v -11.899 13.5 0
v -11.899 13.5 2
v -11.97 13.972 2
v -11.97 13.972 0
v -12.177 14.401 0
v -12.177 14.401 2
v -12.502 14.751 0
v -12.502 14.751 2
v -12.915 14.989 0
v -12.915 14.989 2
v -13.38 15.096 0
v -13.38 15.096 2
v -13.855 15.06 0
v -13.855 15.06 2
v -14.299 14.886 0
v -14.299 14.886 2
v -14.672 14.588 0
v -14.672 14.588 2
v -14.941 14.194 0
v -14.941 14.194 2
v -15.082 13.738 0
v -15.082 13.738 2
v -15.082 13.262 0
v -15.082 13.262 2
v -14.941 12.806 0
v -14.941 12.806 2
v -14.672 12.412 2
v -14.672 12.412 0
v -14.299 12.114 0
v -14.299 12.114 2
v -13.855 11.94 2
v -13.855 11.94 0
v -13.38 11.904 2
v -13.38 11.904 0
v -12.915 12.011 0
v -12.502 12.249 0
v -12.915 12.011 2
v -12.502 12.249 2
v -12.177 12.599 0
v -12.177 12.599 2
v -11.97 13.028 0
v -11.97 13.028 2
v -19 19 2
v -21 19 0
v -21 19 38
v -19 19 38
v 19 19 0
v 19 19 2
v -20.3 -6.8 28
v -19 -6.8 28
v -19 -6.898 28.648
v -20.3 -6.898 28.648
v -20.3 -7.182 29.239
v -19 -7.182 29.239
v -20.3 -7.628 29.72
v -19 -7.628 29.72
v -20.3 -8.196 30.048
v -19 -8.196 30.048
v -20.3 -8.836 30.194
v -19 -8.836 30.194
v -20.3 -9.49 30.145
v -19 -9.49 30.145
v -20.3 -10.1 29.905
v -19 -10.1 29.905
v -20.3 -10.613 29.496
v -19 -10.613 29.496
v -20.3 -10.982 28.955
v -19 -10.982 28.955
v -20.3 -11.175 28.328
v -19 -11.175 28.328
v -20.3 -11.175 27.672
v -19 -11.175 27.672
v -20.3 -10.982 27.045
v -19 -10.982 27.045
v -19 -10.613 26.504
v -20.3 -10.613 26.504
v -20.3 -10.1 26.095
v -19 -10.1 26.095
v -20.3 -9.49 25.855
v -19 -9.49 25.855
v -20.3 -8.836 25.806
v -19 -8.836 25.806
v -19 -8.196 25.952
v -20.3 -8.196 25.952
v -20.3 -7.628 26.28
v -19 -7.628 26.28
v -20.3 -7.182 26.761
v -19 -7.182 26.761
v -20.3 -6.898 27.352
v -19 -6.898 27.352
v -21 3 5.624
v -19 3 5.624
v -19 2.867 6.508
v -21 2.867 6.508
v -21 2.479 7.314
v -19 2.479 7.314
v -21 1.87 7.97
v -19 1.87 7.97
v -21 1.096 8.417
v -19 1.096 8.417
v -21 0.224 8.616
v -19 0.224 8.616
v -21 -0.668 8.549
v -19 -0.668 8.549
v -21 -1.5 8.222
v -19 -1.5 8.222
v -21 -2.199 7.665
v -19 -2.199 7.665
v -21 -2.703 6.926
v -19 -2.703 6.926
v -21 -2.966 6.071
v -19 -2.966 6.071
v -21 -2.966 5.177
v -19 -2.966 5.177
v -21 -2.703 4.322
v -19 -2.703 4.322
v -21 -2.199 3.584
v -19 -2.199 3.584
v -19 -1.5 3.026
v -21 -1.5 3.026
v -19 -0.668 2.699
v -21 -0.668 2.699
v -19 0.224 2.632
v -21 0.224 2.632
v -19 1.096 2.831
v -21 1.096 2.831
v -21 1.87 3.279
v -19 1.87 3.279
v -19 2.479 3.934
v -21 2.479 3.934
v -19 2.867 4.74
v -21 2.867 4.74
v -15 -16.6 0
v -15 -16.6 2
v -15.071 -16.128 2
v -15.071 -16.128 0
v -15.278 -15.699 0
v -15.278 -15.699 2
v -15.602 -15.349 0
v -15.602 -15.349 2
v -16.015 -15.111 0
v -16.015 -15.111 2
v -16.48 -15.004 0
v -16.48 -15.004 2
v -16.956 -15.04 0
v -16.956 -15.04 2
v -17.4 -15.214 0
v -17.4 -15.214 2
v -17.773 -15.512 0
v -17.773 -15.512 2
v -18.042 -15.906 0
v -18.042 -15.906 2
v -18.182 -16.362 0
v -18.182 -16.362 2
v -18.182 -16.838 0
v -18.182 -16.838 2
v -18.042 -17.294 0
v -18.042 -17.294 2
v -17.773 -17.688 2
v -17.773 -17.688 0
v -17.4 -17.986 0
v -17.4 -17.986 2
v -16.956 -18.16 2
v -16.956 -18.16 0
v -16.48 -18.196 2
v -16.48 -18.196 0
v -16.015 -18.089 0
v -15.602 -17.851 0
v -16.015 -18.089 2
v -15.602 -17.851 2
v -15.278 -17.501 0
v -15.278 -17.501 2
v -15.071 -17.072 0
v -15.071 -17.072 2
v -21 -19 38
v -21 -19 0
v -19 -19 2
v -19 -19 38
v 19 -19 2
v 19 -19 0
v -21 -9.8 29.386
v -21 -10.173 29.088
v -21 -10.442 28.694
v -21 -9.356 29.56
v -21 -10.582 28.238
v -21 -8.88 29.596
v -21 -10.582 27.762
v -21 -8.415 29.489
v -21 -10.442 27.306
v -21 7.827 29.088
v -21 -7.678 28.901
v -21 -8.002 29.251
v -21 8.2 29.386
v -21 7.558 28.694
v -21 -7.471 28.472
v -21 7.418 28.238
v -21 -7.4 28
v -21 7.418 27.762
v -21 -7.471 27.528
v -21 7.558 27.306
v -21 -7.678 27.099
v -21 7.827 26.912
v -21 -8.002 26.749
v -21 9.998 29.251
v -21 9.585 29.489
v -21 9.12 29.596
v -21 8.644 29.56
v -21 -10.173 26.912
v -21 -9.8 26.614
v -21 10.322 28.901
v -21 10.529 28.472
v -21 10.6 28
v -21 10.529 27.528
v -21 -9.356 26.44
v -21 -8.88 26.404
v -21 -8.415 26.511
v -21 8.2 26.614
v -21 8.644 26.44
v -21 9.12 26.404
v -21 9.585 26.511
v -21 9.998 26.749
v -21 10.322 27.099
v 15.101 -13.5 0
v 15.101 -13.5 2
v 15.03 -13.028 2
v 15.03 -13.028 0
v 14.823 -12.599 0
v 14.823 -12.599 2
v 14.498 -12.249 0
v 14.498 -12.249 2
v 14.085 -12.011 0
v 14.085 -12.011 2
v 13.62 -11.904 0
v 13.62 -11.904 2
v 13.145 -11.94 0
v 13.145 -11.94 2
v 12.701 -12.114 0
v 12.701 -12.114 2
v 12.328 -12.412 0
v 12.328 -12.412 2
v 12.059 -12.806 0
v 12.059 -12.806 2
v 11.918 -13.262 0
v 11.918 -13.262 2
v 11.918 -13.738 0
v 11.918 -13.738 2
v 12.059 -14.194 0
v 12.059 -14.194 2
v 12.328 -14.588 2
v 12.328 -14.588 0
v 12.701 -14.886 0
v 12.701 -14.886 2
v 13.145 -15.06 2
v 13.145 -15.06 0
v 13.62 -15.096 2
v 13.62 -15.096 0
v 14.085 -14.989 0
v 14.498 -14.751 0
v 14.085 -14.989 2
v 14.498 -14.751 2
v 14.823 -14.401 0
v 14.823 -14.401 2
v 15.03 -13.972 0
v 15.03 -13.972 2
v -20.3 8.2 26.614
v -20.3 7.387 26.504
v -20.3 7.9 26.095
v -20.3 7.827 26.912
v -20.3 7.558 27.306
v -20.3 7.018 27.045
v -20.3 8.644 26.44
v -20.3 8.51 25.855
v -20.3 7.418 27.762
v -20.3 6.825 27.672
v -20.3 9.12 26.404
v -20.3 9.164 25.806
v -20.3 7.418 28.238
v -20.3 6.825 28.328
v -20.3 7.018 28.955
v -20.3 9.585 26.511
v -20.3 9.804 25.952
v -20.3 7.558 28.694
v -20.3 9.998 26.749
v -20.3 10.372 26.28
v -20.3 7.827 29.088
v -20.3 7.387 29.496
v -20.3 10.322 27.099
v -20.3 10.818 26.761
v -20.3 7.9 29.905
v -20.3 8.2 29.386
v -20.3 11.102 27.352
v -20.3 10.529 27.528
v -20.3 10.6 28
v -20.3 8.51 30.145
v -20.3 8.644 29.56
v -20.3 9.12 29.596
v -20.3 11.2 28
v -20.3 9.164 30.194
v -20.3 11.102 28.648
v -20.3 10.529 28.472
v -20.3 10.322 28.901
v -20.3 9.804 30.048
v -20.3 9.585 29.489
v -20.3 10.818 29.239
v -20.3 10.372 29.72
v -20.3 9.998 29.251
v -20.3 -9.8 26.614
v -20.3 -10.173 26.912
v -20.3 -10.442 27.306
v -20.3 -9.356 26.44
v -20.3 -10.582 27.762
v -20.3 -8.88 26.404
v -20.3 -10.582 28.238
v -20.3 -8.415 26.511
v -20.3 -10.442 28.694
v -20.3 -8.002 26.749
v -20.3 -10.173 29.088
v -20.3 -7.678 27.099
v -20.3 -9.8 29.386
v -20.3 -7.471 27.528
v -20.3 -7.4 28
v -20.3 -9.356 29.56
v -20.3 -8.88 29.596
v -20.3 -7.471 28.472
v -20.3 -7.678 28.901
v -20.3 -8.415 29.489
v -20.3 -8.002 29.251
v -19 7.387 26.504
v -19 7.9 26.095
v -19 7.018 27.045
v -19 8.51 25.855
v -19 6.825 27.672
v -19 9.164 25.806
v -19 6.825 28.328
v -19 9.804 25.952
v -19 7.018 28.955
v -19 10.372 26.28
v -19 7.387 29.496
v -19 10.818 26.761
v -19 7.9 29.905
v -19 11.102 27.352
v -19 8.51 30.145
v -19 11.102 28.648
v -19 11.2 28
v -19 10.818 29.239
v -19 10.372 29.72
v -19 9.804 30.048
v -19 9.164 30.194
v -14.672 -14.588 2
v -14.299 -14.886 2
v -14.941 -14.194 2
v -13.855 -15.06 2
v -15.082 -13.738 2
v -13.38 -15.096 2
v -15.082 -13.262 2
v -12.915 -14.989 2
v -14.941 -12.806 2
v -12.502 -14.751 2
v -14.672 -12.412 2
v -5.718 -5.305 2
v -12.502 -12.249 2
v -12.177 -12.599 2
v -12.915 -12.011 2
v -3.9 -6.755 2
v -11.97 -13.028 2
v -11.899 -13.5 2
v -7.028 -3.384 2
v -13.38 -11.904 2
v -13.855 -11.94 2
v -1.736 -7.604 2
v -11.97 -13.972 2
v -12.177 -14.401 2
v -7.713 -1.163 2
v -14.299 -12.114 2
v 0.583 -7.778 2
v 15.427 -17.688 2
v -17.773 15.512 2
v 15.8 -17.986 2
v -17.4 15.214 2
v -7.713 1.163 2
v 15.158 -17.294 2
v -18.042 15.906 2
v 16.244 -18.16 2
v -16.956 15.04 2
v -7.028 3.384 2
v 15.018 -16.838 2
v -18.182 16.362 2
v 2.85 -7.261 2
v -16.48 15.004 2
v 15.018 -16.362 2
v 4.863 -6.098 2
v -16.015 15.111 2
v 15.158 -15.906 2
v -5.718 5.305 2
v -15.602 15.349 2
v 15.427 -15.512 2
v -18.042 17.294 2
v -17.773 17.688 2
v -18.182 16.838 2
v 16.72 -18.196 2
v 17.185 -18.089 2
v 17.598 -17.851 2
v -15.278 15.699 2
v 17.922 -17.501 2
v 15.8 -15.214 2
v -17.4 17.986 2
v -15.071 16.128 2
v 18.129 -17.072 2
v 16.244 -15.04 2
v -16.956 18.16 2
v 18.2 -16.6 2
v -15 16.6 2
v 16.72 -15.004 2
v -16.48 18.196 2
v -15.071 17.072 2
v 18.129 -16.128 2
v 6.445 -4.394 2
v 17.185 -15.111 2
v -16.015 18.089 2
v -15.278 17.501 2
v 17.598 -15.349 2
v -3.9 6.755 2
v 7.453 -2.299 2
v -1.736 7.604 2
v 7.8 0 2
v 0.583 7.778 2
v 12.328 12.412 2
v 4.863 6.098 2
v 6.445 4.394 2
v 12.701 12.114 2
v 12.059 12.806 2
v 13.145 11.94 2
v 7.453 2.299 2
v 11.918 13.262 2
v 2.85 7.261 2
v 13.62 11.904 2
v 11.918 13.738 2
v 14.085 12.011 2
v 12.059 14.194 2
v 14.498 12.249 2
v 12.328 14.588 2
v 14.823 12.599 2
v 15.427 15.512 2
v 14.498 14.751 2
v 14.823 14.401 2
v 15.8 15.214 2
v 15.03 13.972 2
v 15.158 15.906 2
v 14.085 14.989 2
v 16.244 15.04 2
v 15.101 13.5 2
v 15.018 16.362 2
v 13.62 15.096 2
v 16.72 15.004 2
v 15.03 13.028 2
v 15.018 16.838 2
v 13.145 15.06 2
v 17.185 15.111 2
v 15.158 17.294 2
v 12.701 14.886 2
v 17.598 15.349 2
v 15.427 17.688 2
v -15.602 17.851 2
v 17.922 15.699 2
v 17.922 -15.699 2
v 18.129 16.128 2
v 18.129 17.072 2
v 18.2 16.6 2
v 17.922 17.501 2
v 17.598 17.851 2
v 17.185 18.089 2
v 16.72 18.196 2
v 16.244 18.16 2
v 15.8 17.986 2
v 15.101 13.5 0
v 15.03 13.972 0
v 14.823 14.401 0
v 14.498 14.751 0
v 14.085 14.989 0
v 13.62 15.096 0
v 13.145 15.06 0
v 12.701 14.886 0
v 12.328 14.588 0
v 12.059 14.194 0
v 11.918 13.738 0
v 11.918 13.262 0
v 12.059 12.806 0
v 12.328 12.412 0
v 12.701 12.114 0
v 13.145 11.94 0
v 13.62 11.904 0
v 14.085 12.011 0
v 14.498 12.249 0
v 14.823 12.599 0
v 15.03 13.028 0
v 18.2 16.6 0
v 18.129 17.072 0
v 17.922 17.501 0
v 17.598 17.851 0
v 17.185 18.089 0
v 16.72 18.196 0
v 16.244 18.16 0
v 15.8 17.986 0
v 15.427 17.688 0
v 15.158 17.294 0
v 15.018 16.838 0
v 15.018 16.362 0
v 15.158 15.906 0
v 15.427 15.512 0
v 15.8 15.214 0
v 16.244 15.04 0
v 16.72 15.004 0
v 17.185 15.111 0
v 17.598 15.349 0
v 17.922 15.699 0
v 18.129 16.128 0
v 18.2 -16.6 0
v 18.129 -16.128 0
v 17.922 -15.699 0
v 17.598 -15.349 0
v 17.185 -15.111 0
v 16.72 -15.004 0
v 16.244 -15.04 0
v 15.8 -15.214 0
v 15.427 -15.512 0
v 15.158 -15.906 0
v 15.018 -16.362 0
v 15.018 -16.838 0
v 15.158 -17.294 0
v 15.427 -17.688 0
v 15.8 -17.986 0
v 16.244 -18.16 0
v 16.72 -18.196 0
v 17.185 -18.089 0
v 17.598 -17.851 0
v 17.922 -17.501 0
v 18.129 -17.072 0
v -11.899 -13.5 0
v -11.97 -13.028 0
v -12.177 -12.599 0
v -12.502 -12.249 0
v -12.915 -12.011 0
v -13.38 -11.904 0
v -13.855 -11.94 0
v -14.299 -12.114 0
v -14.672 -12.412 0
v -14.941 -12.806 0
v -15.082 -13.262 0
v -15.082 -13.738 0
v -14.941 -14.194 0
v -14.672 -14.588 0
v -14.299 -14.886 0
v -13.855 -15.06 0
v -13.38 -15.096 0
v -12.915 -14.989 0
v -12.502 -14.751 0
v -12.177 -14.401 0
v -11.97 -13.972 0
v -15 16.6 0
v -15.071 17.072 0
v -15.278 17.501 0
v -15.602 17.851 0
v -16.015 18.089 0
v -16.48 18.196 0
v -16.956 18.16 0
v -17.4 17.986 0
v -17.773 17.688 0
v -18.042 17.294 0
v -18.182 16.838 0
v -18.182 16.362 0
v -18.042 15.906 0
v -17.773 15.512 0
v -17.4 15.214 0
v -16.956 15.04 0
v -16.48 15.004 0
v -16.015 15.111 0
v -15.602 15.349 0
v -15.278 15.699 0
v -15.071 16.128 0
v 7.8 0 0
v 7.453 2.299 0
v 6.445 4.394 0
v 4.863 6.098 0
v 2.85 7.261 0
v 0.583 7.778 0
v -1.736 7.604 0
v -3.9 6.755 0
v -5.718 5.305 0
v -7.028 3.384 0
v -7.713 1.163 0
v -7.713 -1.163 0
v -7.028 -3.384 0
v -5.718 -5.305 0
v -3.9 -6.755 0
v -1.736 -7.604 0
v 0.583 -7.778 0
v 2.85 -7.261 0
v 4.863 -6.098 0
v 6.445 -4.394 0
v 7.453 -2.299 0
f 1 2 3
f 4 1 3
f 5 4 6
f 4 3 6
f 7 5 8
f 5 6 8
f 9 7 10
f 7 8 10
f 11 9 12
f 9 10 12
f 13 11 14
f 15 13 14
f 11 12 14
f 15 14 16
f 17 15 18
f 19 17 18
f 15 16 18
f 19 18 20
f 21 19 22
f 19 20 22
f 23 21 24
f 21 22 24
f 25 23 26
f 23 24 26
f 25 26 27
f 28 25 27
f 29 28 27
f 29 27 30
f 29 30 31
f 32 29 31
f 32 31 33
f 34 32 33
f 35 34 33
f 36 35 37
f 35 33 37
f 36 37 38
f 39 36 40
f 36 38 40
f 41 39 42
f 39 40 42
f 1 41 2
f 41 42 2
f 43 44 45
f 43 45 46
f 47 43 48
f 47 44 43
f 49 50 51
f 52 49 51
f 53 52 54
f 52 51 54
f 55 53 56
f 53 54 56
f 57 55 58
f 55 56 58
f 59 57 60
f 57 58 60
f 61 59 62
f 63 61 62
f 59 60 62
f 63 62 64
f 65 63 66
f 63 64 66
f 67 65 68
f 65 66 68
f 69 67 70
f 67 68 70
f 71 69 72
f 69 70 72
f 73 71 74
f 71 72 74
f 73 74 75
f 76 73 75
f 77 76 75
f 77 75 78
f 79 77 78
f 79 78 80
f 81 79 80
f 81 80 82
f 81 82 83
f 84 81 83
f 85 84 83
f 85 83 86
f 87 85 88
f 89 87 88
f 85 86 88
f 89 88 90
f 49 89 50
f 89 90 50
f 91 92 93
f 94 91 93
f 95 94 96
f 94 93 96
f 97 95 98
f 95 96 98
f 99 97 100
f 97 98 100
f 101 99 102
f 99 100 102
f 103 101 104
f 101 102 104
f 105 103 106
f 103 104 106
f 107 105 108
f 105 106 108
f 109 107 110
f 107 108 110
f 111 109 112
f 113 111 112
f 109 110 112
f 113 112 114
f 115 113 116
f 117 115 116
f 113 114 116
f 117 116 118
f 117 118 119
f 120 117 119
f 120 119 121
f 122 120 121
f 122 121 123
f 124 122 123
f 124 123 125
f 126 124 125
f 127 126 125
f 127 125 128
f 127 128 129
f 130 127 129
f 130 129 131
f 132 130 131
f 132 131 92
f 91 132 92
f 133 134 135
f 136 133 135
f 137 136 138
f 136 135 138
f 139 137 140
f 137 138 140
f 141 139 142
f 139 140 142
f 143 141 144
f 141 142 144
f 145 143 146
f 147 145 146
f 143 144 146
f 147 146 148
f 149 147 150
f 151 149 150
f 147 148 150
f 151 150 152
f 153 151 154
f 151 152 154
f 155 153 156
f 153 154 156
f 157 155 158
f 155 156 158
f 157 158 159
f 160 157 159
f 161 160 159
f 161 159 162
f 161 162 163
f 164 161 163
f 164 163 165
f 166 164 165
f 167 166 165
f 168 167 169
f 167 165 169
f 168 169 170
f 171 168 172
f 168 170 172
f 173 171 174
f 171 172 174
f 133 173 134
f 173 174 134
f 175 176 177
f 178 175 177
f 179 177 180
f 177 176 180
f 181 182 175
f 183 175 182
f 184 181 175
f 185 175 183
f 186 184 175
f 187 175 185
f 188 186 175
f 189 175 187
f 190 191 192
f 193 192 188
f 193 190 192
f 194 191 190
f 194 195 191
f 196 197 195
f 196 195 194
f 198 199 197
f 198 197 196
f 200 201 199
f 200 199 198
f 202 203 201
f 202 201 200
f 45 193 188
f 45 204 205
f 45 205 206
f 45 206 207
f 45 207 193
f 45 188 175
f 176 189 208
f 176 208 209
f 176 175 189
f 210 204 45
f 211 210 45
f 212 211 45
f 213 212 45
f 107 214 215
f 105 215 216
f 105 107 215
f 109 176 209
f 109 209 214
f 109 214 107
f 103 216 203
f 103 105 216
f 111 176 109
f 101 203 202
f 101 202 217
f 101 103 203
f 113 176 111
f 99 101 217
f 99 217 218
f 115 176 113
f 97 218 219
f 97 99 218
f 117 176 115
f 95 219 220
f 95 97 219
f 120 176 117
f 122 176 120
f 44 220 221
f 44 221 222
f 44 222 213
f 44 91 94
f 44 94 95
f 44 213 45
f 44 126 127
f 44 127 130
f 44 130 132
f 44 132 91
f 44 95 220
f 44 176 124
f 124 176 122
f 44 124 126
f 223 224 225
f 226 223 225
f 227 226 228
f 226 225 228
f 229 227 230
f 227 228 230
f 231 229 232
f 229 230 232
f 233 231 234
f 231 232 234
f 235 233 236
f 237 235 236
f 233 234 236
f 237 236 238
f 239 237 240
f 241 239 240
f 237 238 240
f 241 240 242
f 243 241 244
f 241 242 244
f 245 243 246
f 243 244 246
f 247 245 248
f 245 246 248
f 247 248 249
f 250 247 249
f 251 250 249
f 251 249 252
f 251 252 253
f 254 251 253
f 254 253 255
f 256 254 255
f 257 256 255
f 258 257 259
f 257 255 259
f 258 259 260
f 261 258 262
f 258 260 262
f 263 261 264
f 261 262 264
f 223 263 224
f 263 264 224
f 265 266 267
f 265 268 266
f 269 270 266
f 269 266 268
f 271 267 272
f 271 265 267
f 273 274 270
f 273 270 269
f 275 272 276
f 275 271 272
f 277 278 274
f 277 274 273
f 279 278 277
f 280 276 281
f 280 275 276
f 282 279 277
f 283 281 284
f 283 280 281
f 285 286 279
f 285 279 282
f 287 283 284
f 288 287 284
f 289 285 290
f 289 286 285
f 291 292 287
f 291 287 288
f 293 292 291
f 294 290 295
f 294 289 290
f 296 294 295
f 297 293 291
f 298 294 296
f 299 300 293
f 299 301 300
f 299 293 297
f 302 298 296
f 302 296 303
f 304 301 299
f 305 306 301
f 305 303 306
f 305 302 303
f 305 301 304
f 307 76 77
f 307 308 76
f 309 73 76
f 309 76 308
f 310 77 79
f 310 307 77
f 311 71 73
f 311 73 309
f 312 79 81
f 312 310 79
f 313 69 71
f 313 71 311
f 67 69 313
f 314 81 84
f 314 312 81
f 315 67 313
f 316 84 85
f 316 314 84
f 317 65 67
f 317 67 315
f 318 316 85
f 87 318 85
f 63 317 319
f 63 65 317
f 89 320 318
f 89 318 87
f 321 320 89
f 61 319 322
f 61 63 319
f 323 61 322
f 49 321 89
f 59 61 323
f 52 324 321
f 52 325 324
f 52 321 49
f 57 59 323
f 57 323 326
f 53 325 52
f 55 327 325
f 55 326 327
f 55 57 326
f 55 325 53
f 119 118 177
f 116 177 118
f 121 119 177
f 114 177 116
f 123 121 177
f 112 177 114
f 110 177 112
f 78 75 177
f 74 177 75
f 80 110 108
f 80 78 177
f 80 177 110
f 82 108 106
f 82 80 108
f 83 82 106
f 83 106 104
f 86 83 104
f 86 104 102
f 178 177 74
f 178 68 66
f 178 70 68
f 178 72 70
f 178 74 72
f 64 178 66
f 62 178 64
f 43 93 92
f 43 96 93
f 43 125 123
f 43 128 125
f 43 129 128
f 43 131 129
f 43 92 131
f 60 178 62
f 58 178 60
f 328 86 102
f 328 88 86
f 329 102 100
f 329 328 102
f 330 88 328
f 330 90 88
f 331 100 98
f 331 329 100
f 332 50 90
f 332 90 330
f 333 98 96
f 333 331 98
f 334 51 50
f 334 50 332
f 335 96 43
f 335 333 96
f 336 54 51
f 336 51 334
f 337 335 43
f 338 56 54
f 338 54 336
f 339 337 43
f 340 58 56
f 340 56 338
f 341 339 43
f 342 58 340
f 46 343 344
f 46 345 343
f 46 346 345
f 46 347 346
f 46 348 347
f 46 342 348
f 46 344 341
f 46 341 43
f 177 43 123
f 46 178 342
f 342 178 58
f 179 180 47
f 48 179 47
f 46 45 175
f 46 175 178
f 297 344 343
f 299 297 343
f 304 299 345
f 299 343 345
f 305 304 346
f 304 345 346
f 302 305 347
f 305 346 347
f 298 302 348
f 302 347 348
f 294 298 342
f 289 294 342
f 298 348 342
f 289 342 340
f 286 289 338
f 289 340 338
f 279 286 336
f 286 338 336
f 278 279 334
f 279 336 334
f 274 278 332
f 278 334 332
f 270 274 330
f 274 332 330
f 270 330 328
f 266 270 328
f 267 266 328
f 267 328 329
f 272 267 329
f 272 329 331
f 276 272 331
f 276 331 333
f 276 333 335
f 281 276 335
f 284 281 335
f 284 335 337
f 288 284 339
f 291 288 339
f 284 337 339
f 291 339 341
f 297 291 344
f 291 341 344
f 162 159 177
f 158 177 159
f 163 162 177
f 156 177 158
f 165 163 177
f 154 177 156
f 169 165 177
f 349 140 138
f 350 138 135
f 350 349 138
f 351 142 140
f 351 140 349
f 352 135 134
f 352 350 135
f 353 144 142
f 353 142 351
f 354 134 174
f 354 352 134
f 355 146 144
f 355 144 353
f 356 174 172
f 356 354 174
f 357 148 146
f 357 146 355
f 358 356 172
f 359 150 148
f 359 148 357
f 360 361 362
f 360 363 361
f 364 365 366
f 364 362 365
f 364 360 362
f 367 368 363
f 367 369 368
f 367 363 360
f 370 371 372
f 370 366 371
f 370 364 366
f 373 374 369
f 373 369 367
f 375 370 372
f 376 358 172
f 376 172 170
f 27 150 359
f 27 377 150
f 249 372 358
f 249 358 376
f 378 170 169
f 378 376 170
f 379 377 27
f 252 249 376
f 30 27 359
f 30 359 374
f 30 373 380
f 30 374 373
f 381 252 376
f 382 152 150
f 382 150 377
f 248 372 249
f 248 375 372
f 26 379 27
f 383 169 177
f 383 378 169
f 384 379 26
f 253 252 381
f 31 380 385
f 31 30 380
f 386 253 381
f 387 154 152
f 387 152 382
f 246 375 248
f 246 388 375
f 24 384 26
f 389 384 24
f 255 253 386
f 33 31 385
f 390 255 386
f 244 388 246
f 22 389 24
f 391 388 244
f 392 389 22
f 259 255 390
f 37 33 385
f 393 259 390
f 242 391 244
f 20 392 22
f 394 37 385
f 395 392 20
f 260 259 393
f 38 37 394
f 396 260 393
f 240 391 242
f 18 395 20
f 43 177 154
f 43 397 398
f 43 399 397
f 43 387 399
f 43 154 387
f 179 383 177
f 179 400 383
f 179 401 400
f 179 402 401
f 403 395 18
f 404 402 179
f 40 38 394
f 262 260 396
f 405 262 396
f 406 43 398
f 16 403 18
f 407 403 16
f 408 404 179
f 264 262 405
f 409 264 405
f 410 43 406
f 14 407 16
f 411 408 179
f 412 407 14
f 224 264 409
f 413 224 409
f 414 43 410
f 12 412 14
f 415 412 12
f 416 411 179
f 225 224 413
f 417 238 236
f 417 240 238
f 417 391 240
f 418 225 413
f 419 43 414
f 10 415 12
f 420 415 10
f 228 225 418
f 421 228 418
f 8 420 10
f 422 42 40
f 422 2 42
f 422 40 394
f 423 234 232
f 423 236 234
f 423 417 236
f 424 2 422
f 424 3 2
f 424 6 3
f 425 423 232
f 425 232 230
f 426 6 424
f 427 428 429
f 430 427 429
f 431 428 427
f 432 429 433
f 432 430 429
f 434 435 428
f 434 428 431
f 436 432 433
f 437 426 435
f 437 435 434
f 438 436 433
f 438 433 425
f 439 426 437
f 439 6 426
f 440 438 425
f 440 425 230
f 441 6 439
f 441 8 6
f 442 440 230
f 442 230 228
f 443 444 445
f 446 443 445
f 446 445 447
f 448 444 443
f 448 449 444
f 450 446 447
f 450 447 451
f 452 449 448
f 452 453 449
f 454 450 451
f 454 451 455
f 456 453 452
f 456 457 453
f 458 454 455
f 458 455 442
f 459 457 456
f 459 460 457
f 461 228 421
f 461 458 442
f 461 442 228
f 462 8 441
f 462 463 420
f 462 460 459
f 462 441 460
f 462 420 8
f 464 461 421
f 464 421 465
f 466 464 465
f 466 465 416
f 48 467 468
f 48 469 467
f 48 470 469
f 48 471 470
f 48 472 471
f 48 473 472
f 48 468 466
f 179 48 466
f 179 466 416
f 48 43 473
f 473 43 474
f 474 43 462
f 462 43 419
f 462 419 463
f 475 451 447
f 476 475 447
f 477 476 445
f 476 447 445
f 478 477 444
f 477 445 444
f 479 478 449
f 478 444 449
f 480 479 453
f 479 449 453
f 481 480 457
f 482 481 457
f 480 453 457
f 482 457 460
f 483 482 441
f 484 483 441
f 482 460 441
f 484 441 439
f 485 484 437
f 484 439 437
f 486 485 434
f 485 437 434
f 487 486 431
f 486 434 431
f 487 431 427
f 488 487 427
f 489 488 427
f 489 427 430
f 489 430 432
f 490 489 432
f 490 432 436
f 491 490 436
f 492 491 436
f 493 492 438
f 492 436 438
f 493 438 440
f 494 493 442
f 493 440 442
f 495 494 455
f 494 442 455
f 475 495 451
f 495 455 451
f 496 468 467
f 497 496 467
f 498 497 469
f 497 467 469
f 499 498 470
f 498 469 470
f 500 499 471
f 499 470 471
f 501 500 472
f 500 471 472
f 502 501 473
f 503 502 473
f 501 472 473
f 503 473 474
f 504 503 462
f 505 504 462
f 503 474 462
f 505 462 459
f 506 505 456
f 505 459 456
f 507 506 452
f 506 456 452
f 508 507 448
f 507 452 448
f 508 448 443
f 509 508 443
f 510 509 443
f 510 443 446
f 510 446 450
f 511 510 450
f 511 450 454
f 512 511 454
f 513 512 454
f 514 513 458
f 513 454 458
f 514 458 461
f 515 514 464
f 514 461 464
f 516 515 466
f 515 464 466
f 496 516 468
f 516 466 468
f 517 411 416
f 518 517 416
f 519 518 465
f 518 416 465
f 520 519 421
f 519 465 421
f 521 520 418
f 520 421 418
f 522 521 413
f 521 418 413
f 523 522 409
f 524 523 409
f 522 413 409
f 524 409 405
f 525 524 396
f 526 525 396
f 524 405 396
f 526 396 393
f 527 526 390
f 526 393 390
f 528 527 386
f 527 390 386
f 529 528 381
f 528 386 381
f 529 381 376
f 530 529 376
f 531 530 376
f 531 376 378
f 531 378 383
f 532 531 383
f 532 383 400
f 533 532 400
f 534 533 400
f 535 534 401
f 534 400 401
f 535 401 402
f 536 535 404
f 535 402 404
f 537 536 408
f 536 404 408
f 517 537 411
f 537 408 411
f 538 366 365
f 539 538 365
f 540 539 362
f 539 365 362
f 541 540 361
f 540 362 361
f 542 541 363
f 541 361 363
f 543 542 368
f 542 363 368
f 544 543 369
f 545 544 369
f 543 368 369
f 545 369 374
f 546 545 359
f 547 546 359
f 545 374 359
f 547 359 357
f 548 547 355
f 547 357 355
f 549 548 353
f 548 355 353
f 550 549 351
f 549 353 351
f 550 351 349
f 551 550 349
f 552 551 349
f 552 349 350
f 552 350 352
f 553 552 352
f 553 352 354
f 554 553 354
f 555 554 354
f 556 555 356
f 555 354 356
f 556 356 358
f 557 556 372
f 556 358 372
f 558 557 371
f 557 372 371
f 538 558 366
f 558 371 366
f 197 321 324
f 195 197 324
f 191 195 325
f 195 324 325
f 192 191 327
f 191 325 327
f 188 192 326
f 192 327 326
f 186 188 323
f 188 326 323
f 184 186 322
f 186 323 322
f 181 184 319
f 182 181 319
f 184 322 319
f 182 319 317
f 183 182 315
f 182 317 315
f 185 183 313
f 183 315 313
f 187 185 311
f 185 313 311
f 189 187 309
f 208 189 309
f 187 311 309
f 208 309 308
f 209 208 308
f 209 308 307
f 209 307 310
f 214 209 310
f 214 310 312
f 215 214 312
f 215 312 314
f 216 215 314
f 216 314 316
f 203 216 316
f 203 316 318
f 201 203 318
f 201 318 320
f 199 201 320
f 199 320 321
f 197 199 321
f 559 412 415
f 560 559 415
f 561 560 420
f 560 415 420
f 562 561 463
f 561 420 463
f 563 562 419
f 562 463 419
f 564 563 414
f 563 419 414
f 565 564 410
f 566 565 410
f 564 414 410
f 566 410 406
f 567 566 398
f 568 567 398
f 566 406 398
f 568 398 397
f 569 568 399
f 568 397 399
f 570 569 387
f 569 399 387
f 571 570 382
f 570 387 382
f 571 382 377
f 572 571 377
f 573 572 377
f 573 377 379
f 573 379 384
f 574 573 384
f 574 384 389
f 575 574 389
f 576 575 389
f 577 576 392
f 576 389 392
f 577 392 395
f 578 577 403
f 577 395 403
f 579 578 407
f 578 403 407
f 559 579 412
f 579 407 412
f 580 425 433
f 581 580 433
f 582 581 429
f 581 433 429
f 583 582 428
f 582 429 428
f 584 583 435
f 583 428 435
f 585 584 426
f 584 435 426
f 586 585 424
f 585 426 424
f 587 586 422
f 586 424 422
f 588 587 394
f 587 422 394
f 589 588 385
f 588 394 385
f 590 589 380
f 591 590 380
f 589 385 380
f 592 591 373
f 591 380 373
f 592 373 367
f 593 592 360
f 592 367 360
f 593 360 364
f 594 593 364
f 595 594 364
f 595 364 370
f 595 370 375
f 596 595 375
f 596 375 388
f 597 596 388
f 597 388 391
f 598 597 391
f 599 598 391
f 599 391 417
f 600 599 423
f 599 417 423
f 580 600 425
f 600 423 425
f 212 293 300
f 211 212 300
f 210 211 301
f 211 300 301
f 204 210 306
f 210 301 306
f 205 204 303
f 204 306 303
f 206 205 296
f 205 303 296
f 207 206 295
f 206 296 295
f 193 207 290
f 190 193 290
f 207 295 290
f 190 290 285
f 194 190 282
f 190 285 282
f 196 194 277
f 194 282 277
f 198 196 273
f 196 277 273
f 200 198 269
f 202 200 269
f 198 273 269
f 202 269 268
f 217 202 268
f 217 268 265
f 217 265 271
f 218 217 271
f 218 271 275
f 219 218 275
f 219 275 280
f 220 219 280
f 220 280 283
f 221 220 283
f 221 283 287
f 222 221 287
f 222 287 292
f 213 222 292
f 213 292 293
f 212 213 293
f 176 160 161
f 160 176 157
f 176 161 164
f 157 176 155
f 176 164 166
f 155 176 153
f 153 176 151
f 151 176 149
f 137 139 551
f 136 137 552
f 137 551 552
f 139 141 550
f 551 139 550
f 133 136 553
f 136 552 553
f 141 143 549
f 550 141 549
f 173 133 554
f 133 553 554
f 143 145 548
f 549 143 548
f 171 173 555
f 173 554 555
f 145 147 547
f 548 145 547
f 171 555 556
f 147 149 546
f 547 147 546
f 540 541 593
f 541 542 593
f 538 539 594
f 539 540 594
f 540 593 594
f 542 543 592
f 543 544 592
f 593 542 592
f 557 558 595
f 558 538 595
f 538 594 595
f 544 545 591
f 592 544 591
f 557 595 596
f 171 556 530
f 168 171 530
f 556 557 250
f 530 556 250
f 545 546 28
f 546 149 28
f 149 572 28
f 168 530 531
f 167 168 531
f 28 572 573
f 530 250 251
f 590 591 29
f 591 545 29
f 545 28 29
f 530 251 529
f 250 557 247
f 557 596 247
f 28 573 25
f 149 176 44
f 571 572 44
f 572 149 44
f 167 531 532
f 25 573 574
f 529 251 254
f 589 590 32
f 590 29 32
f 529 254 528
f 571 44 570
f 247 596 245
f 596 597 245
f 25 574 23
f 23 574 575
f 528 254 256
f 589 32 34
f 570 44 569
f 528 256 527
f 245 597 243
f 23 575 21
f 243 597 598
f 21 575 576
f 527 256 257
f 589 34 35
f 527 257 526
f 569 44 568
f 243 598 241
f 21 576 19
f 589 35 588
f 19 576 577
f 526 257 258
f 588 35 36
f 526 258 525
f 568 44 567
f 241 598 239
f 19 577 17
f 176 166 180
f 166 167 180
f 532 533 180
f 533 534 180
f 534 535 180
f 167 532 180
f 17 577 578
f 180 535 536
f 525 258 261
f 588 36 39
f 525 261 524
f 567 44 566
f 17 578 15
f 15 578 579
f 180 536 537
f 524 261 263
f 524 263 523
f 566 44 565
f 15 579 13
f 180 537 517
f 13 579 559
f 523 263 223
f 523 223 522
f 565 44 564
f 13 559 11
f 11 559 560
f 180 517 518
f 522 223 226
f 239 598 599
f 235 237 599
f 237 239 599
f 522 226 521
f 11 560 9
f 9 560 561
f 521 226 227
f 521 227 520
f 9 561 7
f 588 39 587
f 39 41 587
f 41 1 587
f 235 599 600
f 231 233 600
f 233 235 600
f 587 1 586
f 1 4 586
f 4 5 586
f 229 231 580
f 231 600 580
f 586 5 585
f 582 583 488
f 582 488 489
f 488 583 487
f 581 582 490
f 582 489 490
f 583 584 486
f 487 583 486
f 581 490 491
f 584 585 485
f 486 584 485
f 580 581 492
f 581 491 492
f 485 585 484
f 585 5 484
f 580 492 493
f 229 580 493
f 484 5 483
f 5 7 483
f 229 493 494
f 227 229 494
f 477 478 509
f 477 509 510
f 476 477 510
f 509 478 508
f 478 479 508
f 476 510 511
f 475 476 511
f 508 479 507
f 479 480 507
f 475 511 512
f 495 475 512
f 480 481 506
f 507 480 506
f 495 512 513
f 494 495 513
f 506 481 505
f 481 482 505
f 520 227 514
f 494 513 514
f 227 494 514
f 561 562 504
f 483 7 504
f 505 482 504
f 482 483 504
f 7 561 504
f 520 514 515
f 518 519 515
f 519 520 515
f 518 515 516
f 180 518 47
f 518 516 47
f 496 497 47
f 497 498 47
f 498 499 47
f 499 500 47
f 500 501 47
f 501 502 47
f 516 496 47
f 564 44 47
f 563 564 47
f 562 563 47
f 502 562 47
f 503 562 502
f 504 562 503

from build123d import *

# Parameters (mm, degrees)
SKETCH_W        = 40
SKETCH_H        = 38
PAD_DEPTH       = 38
SKETCH001_W     = 38
SKETCH001_H     = 38
POCKET_DEPTH    = 36
SKETCH002_R     = 1.6
POCKET001_DEPTH = 2
SKETCH004_R     = 3
POCKET002_DEPTH = 3
SKETCH005_R     = 1.6
POCKET003_DEPTH = 3
SKETCH006_R     = 2.2
POCKET004_DEPTH = 1.3
SKETCH007_R     = 7.8
POCKET005_DEPTH = 2


with BuildPart() as part:
    # Sketch → Pad (new body)
    with BuildSketch(Plane.XY):
        with Locations((-1, 0)):
            Rectangle(SKETCH_W, SKETCH_H)
    extrude(amount=PAD_DEPTH)

    # Sketch001 (on Face6 of Pad) → Pocket (cut)
    with BuildSketch(Plane.XY.offset(38)):
        Rectangle(SKETCH001_W, SKETCH001_H)
    extrude(amount=-POCKET_DEPTH, mode=Mode.SUBTRACT)

    # Sketch002 (on Face4 of Pocket) → Pocket001 (cut)
    with BuildSketch(Plane.XY.offset(2)):
        with Locations((13.500611, 13.5)):
            Circle(SKETCH002_R)
        with Locations((-13.499389, -13.5)):
            Circle(SKETCH002_R)
        with Locations((13.500611, -13.5)):
            Circle(SKETCH002_R)
        with Locations((-13.499389, 13.5)):
            Circle(SKETCH002_R)
        with Locations((-16.6, 16.6)):
            Circle(SKETCH002_R)
        with Locations((16.6, 16.6)):
            Circle(SKETCH002_R)
        with Locations((16.6, -16.6)):
            Circle(SKETCH002_R)
        with Locations((-16.6, -16.6)):
            Circle(SKETCH002_R)
    extrude(amount=-POCKET001_DEPTH, mode=Mode.SUBTRACT)

    # Sketch004 (on Face5 of Pocket001) → Pocket002 (cut)
    with BuildSketch(Plane.YZ.offset(-19)):
        with Locations((0, 5.624065)):
            Circle(SKETCH004_R)
    extrude(amount=-POCKET002_DEPTH, mode=Mode.SUBTRACT)

    # Sketch005 (on Face5 of Pocket002) → Pocket003 (cut)
    with BuildSketch(Plane.YZ.offset(-19)):
        with Locations((-9, 28)):
            Circle(SKETCH005_R)
        with Locations((9, 28)):
            Circle(SKETCH005_R)
    extrude(amount=-POCKET003_DEPTH, mode=Mode.SUBTRACT)

    # Sketch006 (on Face5 of Pocket003) → Pocket004 (cut)
    with BuildSketch(Plane.YZ.offset(-19)):
        with Locations((-9, 28)):
            Circle(SKETCH006_R)
        with Locations((9, 28)):
            Circle(SKETCH006_R)
    extrude(amount=-POCKET004_DEPTH, mode=Mode.SUBTRACT)

    # Sketch007 (on Face4 of Pocket004) → Pocket005 (cut)
    with BuildSketch(Plane.XY.offset(2)):
        Circle(SKETCH007_R)
    extrude(amount=-POCKET005_DEPTH, mode=Mode.SUBTRACT)


solid = part.part
